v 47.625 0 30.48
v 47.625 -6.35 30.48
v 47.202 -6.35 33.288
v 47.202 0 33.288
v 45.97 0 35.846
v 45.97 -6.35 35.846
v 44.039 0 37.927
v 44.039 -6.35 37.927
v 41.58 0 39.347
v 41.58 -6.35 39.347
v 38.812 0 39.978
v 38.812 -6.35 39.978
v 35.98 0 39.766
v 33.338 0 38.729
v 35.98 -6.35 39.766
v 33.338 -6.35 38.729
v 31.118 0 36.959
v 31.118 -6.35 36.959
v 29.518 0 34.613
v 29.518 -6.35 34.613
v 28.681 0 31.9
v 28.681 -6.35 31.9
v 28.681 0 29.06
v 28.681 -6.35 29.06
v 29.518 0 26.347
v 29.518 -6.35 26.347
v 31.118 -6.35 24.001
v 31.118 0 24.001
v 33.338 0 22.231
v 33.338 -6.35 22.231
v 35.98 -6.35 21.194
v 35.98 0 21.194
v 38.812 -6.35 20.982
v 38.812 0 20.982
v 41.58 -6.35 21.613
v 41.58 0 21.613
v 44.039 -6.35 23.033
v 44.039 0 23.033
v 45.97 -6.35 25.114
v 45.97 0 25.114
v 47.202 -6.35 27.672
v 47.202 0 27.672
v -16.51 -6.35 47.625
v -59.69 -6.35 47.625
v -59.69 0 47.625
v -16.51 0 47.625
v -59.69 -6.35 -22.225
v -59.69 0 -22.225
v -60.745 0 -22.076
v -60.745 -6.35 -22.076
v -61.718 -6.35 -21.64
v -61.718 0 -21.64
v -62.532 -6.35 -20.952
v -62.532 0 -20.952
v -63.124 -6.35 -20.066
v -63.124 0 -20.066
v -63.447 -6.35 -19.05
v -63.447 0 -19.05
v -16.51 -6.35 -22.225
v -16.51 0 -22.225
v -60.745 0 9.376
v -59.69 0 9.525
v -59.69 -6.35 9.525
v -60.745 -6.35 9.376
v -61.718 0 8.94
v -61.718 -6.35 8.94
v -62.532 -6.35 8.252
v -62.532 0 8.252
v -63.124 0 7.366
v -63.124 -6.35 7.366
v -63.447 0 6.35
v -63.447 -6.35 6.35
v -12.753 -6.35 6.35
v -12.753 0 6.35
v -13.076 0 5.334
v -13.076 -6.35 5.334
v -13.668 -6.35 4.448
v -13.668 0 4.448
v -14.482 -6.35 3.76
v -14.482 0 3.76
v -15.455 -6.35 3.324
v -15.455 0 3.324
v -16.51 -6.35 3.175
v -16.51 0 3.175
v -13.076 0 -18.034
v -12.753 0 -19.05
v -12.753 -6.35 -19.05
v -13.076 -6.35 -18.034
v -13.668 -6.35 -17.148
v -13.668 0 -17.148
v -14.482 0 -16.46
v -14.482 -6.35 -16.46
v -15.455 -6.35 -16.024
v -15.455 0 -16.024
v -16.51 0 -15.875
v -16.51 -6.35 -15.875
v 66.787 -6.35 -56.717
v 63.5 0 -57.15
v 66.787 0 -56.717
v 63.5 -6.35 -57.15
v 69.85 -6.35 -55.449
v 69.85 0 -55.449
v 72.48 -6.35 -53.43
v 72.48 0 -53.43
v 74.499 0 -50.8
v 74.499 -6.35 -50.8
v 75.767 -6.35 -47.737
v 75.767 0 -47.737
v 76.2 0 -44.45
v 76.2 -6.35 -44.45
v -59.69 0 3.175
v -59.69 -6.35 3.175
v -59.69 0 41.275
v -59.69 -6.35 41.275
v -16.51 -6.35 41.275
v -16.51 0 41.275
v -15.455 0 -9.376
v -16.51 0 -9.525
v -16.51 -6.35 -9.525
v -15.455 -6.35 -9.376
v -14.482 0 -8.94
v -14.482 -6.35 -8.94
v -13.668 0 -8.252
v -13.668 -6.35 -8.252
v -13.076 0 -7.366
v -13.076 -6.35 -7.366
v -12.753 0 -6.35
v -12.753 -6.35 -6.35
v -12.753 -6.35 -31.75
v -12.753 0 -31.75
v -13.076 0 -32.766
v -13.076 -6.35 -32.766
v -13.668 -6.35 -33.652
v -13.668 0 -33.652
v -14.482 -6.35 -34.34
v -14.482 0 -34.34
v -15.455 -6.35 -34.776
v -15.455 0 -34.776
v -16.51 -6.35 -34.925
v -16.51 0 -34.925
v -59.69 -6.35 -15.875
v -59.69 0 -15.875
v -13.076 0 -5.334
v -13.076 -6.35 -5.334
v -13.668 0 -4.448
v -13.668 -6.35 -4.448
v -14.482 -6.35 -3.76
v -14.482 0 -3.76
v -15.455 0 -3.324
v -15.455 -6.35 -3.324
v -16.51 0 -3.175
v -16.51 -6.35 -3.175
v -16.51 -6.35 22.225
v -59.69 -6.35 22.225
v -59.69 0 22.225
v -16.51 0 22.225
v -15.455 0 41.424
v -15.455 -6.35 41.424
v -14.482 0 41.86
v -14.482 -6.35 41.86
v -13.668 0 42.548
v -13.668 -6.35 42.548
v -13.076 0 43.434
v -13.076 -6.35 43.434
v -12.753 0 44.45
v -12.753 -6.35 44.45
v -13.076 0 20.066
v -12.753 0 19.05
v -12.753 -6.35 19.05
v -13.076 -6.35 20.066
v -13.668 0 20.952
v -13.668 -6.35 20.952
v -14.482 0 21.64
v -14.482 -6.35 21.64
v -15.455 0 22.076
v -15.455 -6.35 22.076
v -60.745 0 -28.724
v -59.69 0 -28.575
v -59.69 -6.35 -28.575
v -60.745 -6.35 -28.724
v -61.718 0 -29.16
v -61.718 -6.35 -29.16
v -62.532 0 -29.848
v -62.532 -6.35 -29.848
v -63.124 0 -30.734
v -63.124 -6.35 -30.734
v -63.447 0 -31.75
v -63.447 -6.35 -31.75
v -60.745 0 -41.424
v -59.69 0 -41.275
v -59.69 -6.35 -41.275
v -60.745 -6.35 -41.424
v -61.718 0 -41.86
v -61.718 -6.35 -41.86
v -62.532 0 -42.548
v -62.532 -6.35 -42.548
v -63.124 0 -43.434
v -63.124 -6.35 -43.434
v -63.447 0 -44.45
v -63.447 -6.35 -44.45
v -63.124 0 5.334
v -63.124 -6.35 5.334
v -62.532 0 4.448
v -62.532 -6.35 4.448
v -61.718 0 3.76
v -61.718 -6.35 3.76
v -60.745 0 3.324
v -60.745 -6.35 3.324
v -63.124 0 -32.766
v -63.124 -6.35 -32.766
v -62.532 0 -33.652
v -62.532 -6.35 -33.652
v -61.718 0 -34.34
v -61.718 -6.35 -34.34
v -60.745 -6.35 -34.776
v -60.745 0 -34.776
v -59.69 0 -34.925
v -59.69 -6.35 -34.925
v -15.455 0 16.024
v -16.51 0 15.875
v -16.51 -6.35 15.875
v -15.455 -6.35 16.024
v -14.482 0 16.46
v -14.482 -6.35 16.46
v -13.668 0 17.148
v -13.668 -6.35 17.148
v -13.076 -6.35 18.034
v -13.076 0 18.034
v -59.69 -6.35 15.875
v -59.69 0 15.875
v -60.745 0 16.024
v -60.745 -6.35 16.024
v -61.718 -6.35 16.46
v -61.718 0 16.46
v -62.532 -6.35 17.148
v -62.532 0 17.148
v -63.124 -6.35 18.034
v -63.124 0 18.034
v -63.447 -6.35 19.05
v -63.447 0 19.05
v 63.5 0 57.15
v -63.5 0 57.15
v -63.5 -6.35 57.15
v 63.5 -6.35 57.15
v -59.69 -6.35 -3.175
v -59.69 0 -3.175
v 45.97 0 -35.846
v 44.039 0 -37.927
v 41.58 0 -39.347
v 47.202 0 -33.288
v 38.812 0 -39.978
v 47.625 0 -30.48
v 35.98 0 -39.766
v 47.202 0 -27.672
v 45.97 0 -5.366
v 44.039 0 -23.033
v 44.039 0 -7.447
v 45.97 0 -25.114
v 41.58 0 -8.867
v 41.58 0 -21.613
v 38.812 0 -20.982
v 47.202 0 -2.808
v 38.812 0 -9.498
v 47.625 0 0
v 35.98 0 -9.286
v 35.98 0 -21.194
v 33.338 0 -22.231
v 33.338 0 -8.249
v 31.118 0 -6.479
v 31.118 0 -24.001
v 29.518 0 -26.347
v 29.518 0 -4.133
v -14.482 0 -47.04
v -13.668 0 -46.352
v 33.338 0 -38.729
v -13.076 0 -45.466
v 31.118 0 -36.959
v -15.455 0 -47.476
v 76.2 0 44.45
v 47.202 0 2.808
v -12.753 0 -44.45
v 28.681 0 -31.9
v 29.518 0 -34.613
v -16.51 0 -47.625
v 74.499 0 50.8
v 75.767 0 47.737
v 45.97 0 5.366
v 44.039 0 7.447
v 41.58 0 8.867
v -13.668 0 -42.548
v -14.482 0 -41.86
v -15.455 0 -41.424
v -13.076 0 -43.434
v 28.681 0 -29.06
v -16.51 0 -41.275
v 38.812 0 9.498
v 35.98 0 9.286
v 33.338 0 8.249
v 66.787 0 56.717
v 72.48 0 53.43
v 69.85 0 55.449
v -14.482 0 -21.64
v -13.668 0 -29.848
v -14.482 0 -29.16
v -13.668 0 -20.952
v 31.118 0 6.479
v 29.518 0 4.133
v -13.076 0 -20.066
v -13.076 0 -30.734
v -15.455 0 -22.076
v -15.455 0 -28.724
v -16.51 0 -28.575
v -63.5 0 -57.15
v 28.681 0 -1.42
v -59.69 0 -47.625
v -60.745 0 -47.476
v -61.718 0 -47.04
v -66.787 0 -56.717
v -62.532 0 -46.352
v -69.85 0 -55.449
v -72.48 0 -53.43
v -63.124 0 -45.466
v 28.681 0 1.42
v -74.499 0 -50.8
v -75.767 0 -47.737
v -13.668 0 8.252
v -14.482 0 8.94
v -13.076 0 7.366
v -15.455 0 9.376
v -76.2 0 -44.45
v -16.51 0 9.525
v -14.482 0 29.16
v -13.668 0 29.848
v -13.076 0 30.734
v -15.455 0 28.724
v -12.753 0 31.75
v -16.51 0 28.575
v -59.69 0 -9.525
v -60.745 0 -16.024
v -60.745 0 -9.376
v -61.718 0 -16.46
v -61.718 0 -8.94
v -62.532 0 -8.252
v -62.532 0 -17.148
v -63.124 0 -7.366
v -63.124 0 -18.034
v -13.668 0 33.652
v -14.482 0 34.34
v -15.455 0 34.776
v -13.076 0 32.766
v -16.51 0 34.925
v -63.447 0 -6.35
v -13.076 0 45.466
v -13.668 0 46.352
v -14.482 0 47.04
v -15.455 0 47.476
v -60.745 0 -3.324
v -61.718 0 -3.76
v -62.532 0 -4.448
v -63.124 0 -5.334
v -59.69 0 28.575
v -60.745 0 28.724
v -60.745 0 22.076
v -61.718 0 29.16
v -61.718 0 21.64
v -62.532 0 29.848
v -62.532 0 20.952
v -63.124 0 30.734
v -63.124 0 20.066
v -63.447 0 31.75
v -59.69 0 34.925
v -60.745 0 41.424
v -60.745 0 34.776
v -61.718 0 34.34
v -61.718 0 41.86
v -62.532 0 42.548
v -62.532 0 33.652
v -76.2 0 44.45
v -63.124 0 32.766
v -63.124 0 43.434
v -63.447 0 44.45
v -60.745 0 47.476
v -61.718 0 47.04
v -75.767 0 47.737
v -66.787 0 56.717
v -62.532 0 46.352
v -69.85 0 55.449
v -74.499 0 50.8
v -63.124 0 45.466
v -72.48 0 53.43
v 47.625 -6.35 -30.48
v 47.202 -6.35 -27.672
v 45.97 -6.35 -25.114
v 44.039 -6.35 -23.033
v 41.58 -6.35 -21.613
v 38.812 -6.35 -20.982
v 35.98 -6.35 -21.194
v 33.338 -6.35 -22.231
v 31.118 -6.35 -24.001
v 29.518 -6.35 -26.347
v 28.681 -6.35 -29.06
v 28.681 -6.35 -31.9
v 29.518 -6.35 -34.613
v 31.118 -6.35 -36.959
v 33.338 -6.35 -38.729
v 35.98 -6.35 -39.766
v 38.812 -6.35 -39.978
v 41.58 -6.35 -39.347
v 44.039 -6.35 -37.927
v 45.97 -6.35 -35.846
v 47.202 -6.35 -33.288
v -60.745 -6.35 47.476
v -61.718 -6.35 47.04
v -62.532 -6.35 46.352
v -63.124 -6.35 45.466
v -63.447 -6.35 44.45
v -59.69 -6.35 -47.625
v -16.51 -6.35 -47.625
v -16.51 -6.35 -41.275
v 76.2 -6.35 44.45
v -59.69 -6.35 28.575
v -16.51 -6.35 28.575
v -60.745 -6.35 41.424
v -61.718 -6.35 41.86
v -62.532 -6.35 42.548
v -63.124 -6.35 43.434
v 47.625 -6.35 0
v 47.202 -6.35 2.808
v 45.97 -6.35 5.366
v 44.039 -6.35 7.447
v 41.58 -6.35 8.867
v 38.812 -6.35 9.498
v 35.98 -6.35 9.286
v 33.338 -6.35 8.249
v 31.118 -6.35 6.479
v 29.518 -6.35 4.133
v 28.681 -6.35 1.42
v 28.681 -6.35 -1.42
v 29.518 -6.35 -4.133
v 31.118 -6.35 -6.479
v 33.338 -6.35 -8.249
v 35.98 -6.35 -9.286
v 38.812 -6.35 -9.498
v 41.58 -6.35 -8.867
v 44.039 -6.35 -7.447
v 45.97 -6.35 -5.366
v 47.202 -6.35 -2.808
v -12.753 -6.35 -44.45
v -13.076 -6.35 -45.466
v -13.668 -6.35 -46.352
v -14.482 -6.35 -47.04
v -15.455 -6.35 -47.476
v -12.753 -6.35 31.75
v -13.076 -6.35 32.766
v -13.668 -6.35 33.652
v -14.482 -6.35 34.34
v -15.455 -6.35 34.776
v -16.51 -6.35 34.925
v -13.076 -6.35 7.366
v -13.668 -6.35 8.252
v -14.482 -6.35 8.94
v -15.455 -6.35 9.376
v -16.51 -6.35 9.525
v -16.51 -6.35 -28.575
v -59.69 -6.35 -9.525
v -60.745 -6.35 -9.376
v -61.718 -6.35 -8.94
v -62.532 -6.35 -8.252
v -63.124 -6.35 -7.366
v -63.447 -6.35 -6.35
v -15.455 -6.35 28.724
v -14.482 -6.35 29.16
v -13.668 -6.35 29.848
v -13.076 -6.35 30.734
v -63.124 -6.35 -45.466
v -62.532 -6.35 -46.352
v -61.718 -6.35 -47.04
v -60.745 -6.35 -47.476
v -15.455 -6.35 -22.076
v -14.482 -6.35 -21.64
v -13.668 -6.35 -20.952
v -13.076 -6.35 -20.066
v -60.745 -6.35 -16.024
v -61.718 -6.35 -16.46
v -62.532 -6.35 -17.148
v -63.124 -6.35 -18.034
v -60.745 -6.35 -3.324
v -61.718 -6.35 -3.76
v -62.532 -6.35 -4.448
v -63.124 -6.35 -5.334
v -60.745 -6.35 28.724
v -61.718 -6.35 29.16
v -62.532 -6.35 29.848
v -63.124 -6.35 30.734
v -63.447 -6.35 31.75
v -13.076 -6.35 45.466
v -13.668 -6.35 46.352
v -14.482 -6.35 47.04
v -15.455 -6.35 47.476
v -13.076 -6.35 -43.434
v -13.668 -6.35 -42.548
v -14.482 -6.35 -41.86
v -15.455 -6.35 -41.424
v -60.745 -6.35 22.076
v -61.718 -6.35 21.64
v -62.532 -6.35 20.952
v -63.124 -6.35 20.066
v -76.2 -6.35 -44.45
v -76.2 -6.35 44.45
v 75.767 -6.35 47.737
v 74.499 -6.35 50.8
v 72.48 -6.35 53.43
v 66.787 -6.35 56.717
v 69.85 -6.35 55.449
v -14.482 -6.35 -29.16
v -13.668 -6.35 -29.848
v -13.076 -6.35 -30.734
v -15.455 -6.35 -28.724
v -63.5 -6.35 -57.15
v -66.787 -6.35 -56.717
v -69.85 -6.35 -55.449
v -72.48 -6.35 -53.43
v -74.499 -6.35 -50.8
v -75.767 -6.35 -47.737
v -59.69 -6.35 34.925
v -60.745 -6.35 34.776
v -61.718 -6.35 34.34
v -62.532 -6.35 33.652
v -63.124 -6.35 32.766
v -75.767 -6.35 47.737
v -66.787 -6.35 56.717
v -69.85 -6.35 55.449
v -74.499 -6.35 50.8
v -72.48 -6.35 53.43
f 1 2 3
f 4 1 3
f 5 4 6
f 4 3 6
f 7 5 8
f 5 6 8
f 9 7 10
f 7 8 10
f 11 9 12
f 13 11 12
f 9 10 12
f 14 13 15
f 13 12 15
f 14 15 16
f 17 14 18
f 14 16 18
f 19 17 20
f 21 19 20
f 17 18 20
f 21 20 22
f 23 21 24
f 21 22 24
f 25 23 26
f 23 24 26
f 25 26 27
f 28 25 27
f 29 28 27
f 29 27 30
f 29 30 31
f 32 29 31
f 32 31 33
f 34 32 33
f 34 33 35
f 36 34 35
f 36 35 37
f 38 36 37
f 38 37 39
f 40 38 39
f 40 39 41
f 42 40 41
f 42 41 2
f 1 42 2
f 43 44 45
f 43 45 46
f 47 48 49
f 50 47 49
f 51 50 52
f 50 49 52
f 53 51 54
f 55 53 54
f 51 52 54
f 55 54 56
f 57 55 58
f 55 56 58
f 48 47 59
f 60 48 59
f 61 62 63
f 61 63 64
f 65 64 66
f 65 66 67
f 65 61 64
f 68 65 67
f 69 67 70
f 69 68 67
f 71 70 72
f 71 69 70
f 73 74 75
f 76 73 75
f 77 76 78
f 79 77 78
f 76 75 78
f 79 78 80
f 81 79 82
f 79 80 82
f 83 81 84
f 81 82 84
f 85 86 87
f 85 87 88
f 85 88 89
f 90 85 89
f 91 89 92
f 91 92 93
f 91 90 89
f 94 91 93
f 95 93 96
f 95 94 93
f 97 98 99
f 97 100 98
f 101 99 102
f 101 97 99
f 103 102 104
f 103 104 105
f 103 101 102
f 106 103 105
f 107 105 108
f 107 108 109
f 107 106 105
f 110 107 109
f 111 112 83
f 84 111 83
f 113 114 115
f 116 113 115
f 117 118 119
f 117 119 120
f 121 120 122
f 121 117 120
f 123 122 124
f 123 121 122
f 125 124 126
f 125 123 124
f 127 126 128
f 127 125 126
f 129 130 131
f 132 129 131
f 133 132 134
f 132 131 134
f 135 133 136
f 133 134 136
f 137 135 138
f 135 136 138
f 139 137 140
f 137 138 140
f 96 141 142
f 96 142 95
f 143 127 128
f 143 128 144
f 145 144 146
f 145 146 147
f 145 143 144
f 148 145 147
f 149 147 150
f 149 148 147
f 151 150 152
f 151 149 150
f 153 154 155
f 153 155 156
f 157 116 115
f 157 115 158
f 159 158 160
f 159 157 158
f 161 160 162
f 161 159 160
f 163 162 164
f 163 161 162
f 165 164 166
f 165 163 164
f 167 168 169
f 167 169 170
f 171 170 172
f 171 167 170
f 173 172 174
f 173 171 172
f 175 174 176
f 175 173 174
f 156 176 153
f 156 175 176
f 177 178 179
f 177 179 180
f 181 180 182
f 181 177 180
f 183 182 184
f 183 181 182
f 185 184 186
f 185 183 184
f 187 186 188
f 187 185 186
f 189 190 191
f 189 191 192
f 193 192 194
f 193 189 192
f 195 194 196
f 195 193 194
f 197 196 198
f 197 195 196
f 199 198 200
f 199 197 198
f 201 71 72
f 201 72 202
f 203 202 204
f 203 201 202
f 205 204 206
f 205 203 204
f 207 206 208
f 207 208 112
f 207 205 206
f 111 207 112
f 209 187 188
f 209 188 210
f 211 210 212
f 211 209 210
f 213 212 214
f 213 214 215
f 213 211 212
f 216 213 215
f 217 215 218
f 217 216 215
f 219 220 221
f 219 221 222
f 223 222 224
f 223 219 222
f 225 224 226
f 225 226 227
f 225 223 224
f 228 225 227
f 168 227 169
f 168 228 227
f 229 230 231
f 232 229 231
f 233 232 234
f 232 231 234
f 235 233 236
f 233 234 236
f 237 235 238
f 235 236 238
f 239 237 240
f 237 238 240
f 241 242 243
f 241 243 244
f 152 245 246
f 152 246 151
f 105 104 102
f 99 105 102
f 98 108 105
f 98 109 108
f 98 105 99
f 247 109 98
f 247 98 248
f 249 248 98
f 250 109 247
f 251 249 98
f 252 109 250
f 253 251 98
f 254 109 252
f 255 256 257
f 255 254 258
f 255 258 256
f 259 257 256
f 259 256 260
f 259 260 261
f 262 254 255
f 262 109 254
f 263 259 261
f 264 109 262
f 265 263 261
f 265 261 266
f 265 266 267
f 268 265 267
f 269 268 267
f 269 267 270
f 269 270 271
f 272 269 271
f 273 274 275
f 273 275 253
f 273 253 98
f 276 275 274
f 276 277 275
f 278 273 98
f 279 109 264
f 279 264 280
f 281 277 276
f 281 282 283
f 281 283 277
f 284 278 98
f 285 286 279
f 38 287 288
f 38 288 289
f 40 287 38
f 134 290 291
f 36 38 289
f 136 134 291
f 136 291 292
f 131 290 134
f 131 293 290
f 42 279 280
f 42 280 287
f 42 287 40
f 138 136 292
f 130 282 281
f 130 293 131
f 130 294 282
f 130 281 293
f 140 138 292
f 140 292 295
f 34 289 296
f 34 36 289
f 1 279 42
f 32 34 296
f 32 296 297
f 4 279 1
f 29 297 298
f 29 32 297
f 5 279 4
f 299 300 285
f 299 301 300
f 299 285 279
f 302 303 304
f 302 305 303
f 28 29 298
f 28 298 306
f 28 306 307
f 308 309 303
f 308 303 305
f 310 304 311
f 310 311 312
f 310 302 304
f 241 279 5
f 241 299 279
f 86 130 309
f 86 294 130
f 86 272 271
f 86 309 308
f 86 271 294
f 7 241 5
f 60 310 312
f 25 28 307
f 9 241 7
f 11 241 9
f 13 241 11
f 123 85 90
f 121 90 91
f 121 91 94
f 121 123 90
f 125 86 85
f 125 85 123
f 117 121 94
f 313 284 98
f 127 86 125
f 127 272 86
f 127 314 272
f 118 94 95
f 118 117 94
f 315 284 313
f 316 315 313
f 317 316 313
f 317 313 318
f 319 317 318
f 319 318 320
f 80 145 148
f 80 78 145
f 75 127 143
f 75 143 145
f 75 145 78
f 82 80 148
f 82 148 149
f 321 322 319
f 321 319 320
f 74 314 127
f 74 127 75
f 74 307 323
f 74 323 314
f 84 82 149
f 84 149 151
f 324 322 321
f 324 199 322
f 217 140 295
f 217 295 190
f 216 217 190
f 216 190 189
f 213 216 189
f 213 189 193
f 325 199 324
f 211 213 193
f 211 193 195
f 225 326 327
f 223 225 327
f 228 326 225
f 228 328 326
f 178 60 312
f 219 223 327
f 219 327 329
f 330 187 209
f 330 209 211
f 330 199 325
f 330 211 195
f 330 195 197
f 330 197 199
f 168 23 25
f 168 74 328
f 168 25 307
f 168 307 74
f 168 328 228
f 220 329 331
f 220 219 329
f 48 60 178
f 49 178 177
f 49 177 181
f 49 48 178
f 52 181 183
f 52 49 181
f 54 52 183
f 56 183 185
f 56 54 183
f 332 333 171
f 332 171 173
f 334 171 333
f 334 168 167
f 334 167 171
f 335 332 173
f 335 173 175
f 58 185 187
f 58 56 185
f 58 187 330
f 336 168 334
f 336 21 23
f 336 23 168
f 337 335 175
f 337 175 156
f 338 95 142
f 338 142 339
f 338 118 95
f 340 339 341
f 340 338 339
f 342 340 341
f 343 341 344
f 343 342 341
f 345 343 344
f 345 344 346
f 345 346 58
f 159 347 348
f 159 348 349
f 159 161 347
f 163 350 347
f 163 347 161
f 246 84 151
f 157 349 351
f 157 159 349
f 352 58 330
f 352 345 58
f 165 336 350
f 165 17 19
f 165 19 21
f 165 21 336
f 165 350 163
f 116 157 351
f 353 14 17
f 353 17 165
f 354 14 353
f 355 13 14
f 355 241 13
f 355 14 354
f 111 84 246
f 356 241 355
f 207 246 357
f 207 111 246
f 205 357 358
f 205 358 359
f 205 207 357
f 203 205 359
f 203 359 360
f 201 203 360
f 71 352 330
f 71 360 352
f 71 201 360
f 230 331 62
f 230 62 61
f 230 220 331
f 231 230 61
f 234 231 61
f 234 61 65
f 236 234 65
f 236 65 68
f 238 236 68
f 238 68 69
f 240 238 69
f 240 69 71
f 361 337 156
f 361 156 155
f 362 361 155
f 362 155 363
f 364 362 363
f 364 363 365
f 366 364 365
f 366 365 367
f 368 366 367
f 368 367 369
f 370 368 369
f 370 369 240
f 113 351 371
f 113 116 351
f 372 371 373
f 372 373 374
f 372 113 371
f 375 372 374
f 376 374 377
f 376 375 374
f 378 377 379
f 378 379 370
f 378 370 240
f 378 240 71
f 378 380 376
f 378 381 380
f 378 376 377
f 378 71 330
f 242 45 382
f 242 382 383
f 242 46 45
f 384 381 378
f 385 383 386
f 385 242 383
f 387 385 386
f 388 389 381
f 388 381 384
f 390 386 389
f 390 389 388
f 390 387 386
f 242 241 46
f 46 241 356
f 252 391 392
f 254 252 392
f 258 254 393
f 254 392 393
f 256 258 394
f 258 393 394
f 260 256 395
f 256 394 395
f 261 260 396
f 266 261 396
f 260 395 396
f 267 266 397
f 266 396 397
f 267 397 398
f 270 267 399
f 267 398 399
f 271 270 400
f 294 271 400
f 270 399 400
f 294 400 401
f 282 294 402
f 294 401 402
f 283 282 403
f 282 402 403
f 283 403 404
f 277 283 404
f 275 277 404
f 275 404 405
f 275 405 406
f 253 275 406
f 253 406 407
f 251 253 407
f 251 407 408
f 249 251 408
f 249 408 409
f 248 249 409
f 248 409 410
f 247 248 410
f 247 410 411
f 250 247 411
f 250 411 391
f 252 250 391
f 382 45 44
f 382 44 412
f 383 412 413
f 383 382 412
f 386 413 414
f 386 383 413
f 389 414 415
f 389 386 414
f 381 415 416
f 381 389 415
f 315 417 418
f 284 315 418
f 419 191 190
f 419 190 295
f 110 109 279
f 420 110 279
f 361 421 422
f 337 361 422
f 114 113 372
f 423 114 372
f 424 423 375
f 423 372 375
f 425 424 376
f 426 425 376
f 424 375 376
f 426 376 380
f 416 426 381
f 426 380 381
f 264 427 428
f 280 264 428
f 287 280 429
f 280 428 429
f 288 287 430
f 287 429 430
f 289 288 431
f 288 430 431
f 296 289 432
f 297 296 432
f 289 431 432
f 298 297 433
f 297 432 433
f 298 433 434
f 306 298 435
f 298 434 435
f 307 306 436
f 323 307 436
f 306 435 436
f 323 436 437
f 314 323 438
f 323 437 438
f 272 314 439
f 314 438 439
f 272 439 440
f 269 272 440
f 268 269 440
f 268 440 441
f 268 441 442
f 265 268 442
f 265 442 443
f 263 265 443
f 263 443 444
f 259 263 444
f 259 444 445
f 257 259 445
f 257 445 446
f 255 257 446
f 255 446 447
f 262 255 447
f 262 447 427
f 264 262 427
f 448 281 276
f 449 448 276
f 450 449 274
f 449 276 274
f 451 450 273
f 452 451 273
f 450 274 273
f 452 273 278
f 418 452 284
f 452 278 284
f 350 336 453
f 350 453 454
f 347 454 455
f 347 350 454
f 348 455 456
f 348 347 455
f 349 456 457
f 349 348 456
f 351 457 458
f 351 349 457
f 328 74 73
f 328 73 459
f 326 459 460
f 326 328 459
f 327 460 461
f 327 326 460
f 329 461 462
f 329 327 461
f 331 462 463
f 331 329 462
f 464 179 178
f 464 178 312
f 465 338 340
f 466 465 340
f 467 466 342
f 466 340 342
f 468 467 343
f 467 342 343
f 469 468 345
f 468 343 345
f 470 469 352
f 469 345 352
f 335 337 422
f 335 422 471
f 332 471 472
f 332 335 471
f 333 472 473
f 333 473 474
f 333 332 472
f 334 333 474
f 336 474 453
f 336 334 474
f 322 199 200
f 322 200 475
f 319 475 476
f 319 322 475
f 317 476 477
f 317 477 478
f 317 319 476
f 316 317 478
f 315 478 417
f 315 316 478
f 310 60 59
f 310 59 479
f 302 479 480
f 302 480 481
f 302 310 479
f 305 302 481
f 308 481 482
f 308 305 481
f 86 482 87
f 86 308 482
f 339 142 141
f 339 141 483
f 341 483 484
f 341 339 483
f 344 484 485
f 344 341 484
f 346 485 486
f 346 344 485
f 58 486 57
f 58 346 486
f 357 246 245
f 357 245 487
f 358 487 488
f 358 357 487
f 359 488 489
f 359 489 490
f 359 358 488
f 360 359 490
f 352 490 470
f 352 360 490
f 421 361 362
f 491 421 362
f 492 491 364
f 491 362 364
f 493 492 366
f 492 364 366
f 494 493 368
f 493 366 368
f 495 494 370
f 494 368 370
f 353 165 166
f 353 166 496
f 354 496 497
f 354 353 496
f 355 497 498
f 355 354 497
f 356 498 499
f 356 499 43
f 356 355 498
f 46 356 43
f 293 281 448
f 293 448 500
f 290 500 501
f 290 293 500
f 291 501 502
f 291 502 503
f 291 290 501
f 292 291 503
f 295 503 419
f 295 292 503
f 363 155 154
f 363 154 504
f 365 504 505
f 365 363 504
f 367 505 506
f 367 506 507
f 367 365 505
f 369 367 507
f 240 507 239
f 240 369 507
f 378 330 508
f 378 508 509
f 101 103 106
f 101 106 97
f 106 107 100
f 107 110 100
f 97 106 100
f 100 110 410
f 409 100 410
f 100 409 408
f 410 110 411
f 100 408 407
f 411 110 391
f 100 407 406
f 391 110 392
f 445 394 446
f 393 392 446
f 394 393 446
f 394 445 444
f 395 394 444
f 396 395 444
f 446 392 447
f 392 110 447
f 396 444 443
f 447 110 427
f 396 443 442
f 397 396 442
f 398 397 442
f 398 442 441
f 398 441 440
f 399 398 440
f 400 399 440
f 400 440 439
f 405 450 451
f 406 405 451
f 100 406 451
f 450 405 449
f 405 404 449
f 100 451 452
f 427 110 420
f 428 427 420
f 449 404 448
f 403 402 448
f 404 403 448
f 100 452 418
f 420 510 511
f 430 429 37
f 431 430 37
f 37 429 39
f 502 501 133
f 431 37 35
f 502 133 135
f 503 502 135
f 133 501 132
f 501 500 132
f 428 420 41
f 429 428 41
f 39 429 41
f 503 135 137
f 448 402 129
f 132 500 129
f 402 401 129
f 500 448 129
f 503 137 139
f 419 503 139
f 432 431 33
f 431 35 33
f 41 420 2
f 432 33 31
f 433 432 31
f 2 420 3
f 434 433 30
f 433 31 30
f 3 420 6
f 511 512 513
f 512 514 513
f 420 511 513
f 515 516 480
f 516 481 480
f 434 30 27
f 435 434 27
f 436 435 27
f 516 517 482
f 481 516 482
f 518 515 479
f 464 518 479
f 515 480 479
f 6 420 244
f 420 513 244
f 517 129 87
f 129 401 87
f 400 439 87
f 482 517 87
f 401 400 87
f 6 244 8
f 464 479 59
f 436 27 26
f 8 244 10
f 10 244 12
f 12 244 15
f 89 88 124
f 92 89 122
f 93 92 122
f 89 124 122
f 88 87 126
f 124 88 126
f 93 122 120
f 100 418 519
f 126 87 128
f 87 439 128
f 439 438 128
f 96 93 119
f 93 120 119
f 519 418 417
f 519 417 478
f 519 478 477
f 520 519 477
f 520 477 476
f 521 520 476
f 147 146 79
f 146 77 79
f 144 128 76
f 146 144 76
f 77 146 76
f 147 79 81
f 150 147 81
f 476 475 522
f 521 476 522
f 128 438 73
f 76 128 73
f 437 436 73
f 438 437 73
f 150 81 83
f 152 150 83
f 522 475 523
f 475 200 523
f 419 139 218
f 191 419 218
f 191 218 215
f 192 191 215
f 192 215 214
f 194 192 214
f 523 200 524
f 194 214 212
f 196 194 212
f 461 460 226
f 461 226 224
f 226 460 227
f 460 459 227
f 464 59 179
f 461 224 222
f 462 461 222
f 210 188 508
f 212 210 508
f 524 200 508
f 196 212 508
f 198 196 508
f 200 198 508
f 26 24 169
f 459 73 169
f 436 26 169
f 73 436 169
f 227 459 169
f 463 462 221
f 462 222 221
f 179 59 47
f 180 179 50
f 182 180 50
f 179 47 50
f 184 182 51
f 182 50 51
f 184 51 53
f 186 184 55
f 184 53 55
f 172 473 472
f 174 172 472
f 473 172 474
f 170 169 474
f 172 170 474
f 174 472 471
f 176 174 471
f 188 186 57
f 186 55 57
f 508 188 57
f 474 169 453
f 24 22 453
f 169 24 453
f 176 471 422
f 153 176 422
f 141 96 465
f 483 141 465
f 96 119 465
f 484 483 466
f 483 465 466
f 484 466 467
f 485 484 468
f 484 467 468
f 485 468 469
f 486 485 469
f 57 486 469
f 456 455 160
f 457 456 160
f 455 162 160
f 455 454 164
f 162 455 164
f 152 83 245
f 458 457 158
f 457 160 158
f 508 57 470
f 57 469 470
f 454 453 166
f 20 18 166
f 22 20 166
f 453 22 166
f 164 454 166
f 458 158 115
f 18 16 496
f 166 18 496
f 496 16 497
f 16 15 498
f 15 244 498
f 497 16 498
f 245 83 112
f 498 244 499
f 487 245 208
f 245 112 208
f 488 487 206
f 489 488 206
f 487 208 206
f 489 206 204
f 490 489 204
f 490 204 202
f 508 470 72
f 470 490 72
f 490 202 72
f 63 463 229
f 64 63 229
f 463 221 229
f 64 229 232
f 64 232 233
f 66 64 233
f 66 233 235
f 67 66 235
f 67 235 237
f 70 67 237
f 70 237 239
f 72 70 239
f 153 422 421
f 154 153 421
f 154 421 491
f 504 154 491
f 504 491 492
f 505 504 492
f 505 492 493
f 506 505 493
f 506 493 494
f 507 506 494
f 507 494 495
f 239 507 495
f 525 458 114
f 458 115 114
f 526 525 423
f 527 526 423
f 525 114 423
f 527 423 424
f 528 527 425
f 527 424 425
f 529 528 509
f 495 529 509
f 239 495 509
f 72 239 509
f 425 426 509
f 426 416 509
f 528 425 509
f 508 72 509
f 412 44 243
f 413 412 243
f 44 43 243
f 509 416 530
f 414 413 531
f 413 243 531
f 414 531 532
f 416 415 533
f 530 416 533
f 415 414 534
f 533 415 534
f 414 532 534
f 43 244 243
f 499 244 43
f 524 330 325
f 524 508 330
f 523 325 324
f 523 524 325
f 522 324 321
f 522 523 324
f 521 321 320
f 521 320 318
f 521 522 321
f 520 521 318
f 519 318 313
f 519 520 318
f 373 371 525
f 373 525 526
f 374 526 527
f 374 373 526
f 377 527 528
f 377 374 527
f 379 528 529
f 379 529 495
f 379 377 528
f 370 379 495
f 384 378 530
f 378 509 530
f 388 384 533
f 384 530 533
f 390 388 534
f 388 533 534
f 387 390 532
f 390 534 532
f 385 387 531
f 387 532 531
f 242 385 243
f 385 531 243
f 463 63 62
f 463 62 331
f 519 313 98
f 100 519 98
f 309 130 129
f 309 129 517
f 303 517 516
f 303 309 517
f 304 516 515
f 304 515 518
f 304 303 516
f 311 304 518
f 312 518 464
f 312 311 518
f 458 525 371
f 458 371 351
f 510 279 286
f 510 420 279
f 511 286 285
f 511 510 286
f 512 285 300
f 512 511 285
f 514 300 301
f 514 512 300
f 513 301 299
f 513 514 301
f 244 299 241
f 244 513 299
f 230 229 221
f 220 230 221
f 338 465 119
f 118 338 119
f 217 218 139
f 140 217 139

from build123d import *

# Parameters (mm, degrees)
F0_W         = 152.4
F0_H         = 114.3
F1_DEPTH     = 6.35
F2_R         = 12.7
F3_R         = 9.525
F4_DEPTH     = 25.4
F5_R         = 9.525
F6_DEPTH     = 25.4
F7_R         = 9.525
F8_DEPTH     = 25.4
F16_W        = 50.8
F16_H        = 6.35
F15_W        = 50.8
F15_H        = 6.35
F14_W        = 50.8
F14_H        = 6.35
F13_W        = 50.8
F13_H        = 6.35
F12_W        = 50.8
F12_H        = 6.35
F11_W        = 50.8
F11_H        = 6.35
F10_W        = 50.8
F10_H        = 6.35
F9_W         = 50.8
F9_H         = 6.35
F17_DEPTH    = 25.4
F18_T1_DEPTH = 6.35
F19_T1_DEPTH = 6.35


# Not quite as in the source:
# - a fillet or chamfer that OpenCascade refuses, or shapes differently, is made with other operations: its cross-section is extruded or revolved along the edge and cut away or added


with BuildPart() as f1:
    # F0 (on Front) → F1 (new body)
    with BuildSketch(Plane.XZ):
        Rectangle(F0_W, F0_H)
    extrude(amount=F1_DEPTH)

    # F2
    f2_edges = [f1.edges().sort_by_distance(p)[0] for p in [
        (-76.2, -3.175, 57.15),
        (-76.2, -3.175, -57.15),
        (76.2, -3.175, -57.15),
        (76.2, -3.175, 57.15),
    ]]
    fillet(f2_edges, radius=F2_R)

    # F3 (on face) → F4 (cut)
    with BuildSketch(Plane.XZ.offset(6.35)):
        with Locations((38.1, 30.48)):
            Circle(F3_R)
    extrude(amount=-F4_DEPTH, mode=Mode.SUBTRACT)

    # F5 (on face) → F6 (cut)
    with BuildSketch(Plane.XZ.offset(6.35)):
        with Locations((38.1, 0)):
            Circle(F5_R)
    extrude(amount=-F6_DEPTH, mode=Mode.SUBTRACT)

    # F7 (on face) → F8 (cut)
    with BuildSketch(Plane.XZ.offset(6.35)):
        with Locations((38.1, -30.48)):
            Circle(F7_R)
    extrude(amount=-F8_DEPTH, mode=Mode.SUBTRACT)

    # F16 (on face) + F15 (on face) + F14 (on face) + F13 (on face) + F12 (on face) + F11 (on face) + F10 (on face) + F9 (on face) → F17 (cut)
    with BuildSketch(Plane.XZ.offset(6.35)):
        with Locations((-38.1, 44.45)):
            Rectangle(F16_W, F16_H)
    with BuildSketch(Plane.XZ.offset(6.35)):
        with Locations((-38.1, 31.75)):
            Rectangle(F15_W, F15_H)
    with BuildSketch(Plane.XZ.offset(6.35)):
        with Locations((-38.1, 19.05)):
            Rectangle(F14_W, F14_H)
    with BuildSketch(Plane.XZ.offset(6.35)):
        with Locations((-38.1, 6.35)):
            Rectangle(F13_W, F13_H)
    with BuildSketch(Plane.XZ.offset(6.35)):
        with Locations((-38.1, -6.35)):
            Rectangle(F12_W, F12_H)
    with BuildSketch(Plane.XZ.offset(6.35)):
        with Locations((-38.1, -19.05)):
            Rectangle(F11_W, F11_H)
    with BuildSketch(Plane.XZ.offset(6.35)):
        with Locations((-38.1, -31.75)):
            Rectangle(F10_W, F10_H)
    with BuildSketch(Plane.XZ.offset(6.35)):
        with Locations((-38.1, -44.45)):
            Rectangle(F9_W, F9_H)
    extrude(amount=-F17_DEPTH, mode=Mode.SUBTRACT)

    # F18: fillet of radius 3.81 on 16 edges, made by hand

    # F18_s2 → F18_t1 (join)
    with BuildSketch(Plane.XZ):
        with BuildLine():
            ThreePointArc((-12.7, 6.985), (-13.8159231637, 4.2909231637), (-16.51, 3.175))
            Line((-16.51, 3.175), (-12.7, 3.175))
            Line((-12.7, 3.175), (-12.7, 6.985))
        make_face()
        with BuildLine():
            ThreePointArc((-16.51, -9.525), (-13.8159231637, -8.4090768363), (-12.7, -5.715))
            Line((-12.7, -5.715), (-12.7, -9.525))
            Line((-12.7, -9.525), (-16.51, -9.525))
        make_face()
        with BuildLine():
            ThreePointArc((-12.7, -31.115), (-13.8159231637, -33.8090768363), (-16.51, -34.925))
            Line((-16.51, -34.925), (-12.7, -34.925))
            Line((-12.7, -34.925), (-12.7, -31.115))
        make_face()
        with BuildLine():
            ThreePointArc((-16.51, -22.225), (-13.8159231637, -21.1090768363), (-12.7, -18.415))
            Line((-12.7, -18.415), (-12.7, -22.225))
            Line((-12.7, -22.225), (-16.51, -22.225))
        make_face()
        with BuildLine():
            ThreePointArc((-12.7, -43.815), (-13.8159231637, -46.5090768363), (-16.51, -47.625))
            Line((-16.51, -47.625), (-12.7, -47.625))
            Line((-12.7, -47.625), (-12.7, -43.815))
        make_face()
        with BuildLine():
            ThreePointArc((-16.51, 15.875), (-13.8159231637, 16.9909231637), (-12.7, 19.685))
            Line((-12.7, 19.685), (-12.7, 15.875))
            Line((-12.7, 15.875), (-16.51, 15.875))
        make_face()
        with BuildLine():
            ThreePointArc((-16.51, 28.575), (-13.8159231637, 29.6909231637), (-12.7, 32.385))
            Line((-12.7, 32.385), (-12.7, 28.575))
            Line((-12.7, 28.575), (-16.51, 28.575))
        make_face()
        with BuildLine():
            ThreePointArc((-16.51, 41.275), (-13.8159231637, 42.3909231637), (-12.7, 45.085))
            Line((-12.7, 45.085), (-12.7, 41.275))
            Line((-12.7, 41.275), (-16.51, 41.275))
        make_face()
        with BuildLine():
            ThreePointArc((-12.7, -45.085), (-13.8159231637, -42.3909231637), (-16.51, -41.275))
            Line((-16.51, -41.275), (-12.7, -41.275))
            Line((-12.7, -41.275), (-12.7, -45.085))
        make_face()
        with BuildLine():
            ThreePointArc((-12.7, -32.385), (-13.8159231637, -29.6909231637), (-16.51, -28.575))
            Line((-16.51, -28.575), (-12.7, -28.575))
            Line((-12.7, -28.575), (-12.7, -32.385))
        make_face()
        with BuildLine():
            ThreePointArc((-12.7, -19.685), (-13.8159231637, -16.9909231637), (-16.51, -15.875))
            Line((-16.51, -15.875), (-12.7, -15.875))
            Line((-12.7, -15.875), (-12.7, -19.685))
        make_face()
        with BuildLine():
            ThreePointArc((-12.7, -6.985), (-13.8159231637, -4.2909231637), (-16.51, -3.175))
            Line((-16.51, -3.175), (-12.7, -3.175))
            Line((-12.7, -3.175), (-12.7, -6.985))
        make_face()
        with BuildLine():
            ThreePointArc((-12.7, 5.715), (-13.8159231637, 8.4090768363), (-16.51, 9.525))
            Line((-16.51, 9.525), (-12.7, 9.525))
            Line((-12.7, 9.525), (-12.7, 5.715))
        make_face()
        with BuildLine():
            ThreePointArc((-12.7, 18.415), (-13.8159231637, 21.1090768363), (-16.51, 22.225))
            Line((-16.51, 22.225), (-12.7, 22.225))
            Line((-12.7, 22.225), (-12.7, 18.415))
        make_face()
        with BuildLine():
            ThreePointArc((-12.7, 31.115), (-13.8159231637, 33.8090768363), (-16.51, 34.925))
            Line((-16.51, 34.925), (-12.7, 34.925))
            Line((-12.7, 34.925), (-12.7, 31.115))
        make_face()
        with BuildLine():
            ThreePointArc((-12.7, 43.815), (-13.8159231637, 46.5090768363), (-16.51, 47.625))
            Line((-16.51, 47.625), (-12.7, 47.625))
            Line((-12.7, 47.625), (-12.7, 43.815))
        make_face()
    extrude(amount=F18_T1_DEPTH)

    # F19: fillet of radius 3.81 on 16 edges, made by hand

    # F19_s2 → F19_t1 (join)
    with BuildSketch(Plane.XZ):
        with BuildLine():
            ThreePointArc((-59.69, 47.625), (-62.3840768363, 46.5090768363), (-63.5, 43.815))
            Line((-63.5, 43.815), (-63.5, 47.625))
            Line((-63.5, 47.625), (-59.69, 47.625))
        make_face()
        with BuildLine():
            ThreePointArc((-59.69, 34.925), (-62.3840768363, 33.8090768363), (-63.5, 31.115))
            Line((-63.5, 31.115), (-63.5, 34.925))
            Line((-63.5, 34.925), (-59.69, 34.925))
        make_face()
        with BuildLine():
            ThreePointArc((-59.69, 22.225), (-62.3840768363, 21.1090768363), (-63.5, 18.415))
            Line((-63.5, 18.415), (-63.5, 22.225))
            Line((-63.5, 22.225), (-59.69, 22.225))
        make_face()
        with BuildLine():
            ThreePointArc((-59.69, 9.525), (-62.3840768363, 8.4090768363), (-63.5, 5.715))
            Line((-63.5, 5.715), (-63.5, 9.525))
            Line((-63.5, 9.525), (-59.69, 9.525))
        make_face()
        with BuildLine():
            ThreePointArc((-59.69, -3.175), (-62.3840768363, -4.2909231637), (-63.5, -6.985))
            Line((-63.5, -6.985), (-63.5, -3.175))
            Line((-63.5, -3.175), (-59.69, -3.175))
        make_face()
        with BuildLine():
            ThreePointArc((-59.69, -15.875), (-62.3840768363, -16.9909231637), (-63.5, -19.685))
            Line((-63.5, -19.685), (-63.5, -15.875))
            Line((-63.5, -15.875), (-59.69, -15.875))
        make_face()
        with BuildLine():
            ThreePointArc((-59.69, -28.575), (-62.3840768363, -29.6909231637), (-63.5, -32.385))
            Line((-63.5, -32.385), (-63.5, -28.575))
            Line((-63.5, -28.575), (-59.69, -28.575))
        make_face()
        with BuildLine():
            ThreePointArc((-59.69, -41.275), (-62.3840768363, -42.3909231637), (-63.5, -45.085))
            Line((-63.5, -45.085), (-63.5, -41.275))
            Line((-63.5, -41.275), (-59.69, -41.275))
        make_face()
        with BuildLine():
            ThreePointArc((-59.69, 41.275), (-62.3840768363, 42.3909231637), (-63.5, 45.085))
            Line((-63.5, 45.085), (-63.5, 41.275))
            Line((-63.5, 41.275), (-59.69, 41.275))
        make_face()
        with BuildLine():
            ThreePointArc((-59.69, 28.575), (-62.3840768363, 29.6909231637), (-63.5, 32.385))
            Line((-63.5, 32.385), (-63.5, 28.575))
            Line((-63.5, 28.575), (-59.69, 28.575))
        make_face()
        with BuildLine():
            ThreePointArc((-59.69, 15.875), (-62.3840768363, 16.9909231637), (-63.5, 19.685))
            Line((-63.5, 19.685), (-63.5, 15.875))
            Line((-63.5, 15.875), (-59.69, 15.875))
        make_face()
        with BuildLine():
            ThreePointArc((-63.5, 6.985), (-62.3840768363, 4.2909231637), (-59.69, 3.175))
            Line((-59.69, 3.175), (-63.5, 3.175))
            Line((-63.5, 3.175), (-63.5, 6.985))
        make_face()
        with BuildLine():
            ThreePointArc((-59.69, -9.525), (-62.3840768363, -8.4090768363), (-63.5, -5.715))
            Line((-63.5, -5.715), (-63.5, -9.525))
            Line((-63.5, -9.525), (-59.69, -9.525))
        make_face()
        with BuildLine():
            ThreePointArc((-59.69, -22.225), (-62.3840768363, -21.1090768363), (-63.5, -18.415))
            Line((-63.5, -18.415), (-63.5, -22.225))
            Line((-63.5, -22.225), (-59.69, -22.225))
        make_face()
        with BuildLine():
            ThreePointArc((-63.5, -31.115), (-62.3840768363, -33.8090768363), (-59.69, -34.925))
            Line((-59.69, -34.925), (-63.5, -34.925))
            Line((-63.5, -34.925), (-63.5, -31.115))
        make_face()
        with BuildLine():
            ThreePointArc((-63.5, -43.815), (-62.3840768363, -46.5090768363), (-59.69, -47.625))
            Line((-59.69, -47.625), (-63.5, -47.625))
            Line((-63.5, -47.625), (-63.5, -43.815))
        make_face()
    extrude(amount=F19_T1_DEPTH)


solid = f1.part
